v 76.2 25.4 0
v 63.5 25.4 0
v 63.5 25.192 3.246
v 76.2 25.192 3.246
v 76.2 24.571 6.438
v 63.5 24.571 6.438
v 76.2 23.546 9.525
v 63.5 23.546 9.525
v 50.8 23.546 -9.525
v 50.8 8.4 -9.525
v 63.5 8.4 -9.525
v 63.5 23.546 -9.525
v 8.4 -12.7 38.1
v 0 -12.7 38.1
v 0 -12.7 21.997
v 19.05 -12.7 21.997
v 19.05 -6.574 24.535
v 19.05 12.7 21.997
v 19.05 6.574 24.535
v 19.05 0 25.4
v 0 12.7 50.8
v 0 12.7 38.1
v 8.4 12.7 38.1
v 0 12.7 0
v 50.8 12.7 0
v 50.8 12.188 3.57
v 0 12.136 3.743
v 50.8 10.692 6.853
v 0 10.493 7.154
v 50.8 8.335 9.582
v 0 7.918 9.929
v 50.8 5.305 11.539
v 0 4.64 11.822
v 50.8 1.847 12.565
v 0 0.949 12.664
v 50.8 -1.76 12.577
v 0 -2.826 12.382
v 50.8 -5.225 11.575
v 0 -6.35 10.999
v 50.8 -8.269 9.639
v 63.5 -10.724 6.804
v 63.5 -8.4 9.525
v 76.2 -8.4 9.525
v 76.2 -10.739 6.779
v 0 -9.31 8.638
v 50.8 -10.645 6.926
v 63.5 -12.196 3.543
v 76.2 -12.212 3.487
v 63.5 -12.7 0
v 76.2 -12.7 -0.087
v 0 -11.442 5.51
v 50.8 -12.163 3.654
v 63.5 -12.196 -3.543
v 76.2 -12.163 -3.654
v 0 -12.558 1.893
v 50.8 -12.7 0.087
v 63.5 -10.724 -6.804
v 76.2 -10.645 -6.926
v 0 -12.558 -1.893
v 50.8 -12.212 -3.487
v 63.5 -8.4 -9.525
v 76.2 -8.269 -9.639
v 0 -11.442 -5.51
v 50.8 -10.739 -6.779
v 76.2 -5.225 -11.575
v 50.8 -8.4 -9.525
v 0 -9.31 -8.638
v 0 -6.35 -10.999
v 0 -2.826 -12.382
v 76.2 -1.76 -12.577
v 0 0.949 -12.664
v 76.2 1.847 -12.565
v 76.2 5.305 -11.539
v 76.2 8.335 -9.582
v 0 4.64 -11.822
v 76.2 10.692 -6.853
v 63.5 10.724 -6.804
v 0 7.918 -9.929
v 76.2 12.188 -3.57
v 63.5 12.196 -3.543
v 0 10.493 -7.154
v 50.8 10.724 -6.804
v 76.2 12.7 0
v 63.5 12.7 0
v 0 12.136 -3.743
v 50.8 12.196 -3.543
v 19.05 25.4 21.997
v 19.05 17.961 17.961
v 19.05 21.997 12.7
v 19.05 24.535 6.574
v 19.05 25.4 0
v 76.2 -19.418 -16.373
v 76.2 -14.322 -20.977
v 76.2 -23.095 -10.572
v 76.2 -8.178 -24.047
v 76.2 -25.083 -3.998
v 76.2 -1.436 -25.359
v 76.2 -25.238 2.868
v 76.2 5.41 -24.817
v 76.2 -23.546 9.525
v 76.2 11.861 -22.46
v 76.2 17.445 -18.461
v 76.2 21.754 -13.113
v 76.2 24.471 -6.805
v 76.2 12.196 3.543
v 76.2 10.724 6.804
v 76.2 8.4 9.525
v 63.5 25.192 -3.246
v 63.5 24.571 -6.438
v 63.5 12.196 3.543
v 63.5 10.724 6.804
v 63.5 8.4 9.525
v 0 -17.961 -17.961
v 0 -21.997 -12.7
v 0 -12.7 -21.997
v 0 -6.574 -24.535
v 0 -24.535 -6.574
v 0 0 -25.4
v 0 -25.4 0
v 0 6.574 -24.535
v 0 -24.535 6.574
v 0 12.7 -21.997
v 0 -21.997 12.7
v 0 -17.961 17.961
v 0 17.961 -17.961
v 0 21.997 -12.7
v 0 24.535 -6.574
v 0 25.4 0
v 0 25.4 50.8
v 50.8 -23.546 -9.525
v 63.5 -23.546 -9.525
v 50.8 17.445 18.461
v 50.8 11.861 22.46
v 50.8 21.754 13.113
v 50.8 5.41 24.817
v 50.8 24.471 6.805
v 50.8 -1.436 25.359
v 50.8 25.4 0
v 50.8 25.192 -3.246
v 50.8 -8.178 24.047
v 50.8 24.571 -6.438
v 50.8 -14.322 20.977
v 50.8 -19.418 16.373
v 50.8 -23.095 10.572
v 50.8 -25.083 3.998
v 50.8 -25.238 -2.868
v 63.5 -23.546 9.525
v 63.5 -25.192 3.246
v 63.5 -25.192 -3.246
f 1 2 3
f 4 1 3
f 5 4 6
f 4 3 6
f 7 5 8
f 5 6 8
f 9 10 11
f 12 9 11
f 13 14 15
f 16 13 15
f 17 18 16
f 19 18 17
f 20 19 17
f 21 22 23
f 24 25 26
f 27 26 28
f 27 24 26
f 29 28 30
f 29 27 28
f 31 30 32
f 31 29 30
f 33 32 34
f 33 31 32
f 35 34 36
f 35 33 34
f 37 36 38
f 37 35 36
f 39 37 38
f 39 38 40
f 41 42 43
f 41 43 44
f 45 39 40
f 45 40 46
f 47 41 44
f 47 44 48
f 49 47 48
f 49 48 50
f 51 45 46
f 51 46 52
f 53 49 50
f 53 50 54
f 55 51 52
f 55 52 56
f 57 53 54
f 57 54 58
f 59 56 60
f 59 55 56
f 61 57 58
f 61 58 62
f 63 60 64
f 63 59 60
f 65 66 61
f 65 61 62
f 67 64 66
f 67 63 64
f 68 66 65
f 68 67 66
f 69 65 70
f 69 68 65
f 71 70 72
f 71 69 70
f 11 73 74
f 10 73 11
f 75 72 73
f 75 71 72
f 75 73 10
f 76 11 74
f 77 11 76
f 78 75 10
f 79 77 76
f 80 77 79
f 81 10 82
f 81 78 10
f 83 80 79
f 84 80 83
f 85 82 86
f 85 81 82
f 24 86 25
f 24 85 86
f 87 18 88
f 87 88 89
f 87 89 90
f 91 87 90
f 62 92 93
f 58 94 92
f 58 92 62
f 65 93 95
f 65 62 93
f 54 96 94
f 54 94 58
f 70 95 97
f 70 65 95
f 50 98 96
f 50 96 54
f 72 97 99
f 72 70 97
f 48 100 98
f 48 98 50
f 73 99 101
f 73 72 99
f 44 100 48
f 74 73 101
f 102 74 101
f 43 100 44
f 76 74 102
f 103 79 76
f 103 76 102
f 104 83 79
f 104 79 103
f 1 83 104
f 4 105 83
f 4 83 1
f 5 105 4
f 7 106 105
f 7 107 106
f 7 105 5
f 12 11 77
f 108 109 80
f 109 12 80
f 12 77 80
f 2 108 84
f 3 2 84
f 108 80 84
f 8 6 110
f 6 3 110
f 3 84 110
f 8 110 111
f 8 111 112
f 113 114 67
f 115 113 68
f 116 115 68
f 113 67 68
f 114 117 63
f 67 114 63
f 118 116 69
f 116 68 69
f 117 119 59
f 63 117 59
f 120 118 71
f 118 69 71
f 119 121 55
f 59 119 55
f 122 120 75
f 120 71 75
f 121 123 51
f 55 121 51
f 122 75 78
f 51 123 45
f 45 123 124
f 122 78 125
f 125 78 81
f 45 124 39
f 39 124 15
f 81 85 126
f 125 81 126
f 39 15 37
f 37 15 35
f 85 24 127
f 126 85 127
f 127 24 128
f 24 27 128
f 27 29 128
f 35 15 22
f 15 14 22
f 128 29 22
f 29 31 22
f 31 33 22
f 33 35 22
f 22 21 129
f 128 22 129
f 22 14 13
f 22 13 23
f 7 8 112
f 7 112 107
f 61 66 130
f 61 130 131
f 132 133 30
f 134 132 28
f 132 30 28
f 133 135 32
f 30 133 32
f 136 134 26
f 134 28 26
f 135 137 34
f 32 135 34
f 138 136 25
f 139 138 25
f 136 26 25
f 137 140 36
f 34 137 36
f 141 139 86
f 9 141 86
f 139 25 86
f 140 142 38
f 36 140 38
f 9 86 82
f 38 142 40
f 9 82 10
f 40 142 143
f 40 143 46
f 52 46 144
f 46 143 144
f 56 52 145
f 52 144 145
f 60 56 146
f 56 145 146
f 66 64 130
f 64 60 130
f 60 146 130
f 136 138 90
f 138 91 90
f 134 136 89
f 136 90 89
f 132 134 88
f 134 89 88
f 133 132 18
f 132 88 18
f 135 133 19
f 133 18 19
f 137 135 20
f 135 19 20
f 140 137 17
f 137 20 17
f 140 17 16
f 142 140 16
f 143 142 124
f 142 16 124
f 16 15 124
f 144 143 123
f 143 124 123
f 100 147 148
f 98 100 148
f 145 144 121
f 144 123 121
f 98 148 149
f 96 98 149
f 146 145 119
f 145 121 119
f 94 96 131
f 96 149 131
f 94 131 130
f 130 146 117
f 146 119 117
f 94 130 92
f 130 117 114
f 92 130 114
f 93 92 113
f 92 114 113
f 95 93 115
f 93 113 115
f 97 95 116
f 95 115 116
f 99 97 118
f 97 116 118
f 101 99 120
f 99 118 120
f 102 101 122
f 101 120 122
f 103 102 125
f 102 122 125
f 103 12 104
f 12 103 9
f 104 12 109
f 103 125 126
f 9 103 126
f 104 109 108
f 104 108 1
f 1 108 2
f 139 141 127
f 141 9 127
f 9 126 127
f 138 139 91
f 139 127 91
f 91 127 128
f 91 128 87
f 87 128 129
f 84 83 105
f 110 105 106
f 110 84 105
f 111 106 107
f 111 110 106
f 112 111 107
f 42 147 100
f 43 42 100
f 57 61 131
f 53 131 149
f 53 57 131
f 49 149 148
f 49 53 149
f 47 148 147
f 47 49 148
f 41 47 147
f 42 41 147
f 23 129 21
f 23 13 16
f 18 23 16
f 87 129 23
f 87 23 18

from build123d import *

# Parameters (mm, degrees)
F0_R          = 25.4
F0_R_2        = 12.7
F1_DEPTH      = 76.2
F3_DEPTH      = 25.4
F3_DEPTH_BACK = 25.4
F5_DEPTH      = 19.05
F6_W          = 25.4
F6_H          = 12.7
F7_DEPTH      = 25.4
F9_DEPTH      = 25.401
F9_DEPTH_BACK = 25.4


with BuildPart() as f1:
    # F0 (on Right) → F1 (new body)
    with BuildSketch(Plane.YZ):
        Circle(F0_R)
        Circle(F0_R_2, mode=Mode.SUBTRACT)
    extrude(amount=F1_DEPTH)

    # F2 (on Front) → F3 (cut, two sides)
    with BuildSketch(Plane.XZ) as f3_sk:
        Polygon((76.2, 25.4), (50.8, 25.4), (50.8, -9.525), (63.5, -9.525), (63.5, 9.525), (76.2, 9.525), align=None)
    extrude(amount=-F3_DEPTH, mode=Mode.SUBTRACT)
    extrude(f3_sk.sketch, amount=F3_DEPTH_BACK, mode=Mode.SUBTRACT)

    # F4 (on Right) → F5 (join)
    with BuildSketch(Plane.YZ):
        with BuildLine():
            Line((-12.7, 50.8), (-12.7, 0))
            ThreePointArc((-12.7, 0), (0, 12.7), (12.7, 0))
            Line((12.7, 0), (25.4, 0))
            Line((25.4, 0), (25.4, 50.8))
            Line((25.4, 50.8), (-12.7, 50.8))
        make_face()
    extrude(amount=F5_DEPTH)

    # F6 (on Right) → F7 (cut)
    with BuildSketch(Plane.YZ):
        with Locations((0, 44.45)):
            Rectangle(F6_W, F6_H)
    extrude(amount=F7_DEPTH, mode=Mode.SUBTRACT)

    # F8 (on Front) → F9 (cut, two sides)
    with BuildSketch(Plane.XZ) as f9_sk:
        Polygon((19.05, 50.8), (0, 50.8), (19.05, 21.9970452561), align=None)
    extrude(amount=F9_DEPTH, mode=Mode.SUBTRACT)
    extrude(f9_sk.sketch, amount=-F9_DEPTH_BACK, mode=Mode.SUBTRACT)


solid = f1.part
